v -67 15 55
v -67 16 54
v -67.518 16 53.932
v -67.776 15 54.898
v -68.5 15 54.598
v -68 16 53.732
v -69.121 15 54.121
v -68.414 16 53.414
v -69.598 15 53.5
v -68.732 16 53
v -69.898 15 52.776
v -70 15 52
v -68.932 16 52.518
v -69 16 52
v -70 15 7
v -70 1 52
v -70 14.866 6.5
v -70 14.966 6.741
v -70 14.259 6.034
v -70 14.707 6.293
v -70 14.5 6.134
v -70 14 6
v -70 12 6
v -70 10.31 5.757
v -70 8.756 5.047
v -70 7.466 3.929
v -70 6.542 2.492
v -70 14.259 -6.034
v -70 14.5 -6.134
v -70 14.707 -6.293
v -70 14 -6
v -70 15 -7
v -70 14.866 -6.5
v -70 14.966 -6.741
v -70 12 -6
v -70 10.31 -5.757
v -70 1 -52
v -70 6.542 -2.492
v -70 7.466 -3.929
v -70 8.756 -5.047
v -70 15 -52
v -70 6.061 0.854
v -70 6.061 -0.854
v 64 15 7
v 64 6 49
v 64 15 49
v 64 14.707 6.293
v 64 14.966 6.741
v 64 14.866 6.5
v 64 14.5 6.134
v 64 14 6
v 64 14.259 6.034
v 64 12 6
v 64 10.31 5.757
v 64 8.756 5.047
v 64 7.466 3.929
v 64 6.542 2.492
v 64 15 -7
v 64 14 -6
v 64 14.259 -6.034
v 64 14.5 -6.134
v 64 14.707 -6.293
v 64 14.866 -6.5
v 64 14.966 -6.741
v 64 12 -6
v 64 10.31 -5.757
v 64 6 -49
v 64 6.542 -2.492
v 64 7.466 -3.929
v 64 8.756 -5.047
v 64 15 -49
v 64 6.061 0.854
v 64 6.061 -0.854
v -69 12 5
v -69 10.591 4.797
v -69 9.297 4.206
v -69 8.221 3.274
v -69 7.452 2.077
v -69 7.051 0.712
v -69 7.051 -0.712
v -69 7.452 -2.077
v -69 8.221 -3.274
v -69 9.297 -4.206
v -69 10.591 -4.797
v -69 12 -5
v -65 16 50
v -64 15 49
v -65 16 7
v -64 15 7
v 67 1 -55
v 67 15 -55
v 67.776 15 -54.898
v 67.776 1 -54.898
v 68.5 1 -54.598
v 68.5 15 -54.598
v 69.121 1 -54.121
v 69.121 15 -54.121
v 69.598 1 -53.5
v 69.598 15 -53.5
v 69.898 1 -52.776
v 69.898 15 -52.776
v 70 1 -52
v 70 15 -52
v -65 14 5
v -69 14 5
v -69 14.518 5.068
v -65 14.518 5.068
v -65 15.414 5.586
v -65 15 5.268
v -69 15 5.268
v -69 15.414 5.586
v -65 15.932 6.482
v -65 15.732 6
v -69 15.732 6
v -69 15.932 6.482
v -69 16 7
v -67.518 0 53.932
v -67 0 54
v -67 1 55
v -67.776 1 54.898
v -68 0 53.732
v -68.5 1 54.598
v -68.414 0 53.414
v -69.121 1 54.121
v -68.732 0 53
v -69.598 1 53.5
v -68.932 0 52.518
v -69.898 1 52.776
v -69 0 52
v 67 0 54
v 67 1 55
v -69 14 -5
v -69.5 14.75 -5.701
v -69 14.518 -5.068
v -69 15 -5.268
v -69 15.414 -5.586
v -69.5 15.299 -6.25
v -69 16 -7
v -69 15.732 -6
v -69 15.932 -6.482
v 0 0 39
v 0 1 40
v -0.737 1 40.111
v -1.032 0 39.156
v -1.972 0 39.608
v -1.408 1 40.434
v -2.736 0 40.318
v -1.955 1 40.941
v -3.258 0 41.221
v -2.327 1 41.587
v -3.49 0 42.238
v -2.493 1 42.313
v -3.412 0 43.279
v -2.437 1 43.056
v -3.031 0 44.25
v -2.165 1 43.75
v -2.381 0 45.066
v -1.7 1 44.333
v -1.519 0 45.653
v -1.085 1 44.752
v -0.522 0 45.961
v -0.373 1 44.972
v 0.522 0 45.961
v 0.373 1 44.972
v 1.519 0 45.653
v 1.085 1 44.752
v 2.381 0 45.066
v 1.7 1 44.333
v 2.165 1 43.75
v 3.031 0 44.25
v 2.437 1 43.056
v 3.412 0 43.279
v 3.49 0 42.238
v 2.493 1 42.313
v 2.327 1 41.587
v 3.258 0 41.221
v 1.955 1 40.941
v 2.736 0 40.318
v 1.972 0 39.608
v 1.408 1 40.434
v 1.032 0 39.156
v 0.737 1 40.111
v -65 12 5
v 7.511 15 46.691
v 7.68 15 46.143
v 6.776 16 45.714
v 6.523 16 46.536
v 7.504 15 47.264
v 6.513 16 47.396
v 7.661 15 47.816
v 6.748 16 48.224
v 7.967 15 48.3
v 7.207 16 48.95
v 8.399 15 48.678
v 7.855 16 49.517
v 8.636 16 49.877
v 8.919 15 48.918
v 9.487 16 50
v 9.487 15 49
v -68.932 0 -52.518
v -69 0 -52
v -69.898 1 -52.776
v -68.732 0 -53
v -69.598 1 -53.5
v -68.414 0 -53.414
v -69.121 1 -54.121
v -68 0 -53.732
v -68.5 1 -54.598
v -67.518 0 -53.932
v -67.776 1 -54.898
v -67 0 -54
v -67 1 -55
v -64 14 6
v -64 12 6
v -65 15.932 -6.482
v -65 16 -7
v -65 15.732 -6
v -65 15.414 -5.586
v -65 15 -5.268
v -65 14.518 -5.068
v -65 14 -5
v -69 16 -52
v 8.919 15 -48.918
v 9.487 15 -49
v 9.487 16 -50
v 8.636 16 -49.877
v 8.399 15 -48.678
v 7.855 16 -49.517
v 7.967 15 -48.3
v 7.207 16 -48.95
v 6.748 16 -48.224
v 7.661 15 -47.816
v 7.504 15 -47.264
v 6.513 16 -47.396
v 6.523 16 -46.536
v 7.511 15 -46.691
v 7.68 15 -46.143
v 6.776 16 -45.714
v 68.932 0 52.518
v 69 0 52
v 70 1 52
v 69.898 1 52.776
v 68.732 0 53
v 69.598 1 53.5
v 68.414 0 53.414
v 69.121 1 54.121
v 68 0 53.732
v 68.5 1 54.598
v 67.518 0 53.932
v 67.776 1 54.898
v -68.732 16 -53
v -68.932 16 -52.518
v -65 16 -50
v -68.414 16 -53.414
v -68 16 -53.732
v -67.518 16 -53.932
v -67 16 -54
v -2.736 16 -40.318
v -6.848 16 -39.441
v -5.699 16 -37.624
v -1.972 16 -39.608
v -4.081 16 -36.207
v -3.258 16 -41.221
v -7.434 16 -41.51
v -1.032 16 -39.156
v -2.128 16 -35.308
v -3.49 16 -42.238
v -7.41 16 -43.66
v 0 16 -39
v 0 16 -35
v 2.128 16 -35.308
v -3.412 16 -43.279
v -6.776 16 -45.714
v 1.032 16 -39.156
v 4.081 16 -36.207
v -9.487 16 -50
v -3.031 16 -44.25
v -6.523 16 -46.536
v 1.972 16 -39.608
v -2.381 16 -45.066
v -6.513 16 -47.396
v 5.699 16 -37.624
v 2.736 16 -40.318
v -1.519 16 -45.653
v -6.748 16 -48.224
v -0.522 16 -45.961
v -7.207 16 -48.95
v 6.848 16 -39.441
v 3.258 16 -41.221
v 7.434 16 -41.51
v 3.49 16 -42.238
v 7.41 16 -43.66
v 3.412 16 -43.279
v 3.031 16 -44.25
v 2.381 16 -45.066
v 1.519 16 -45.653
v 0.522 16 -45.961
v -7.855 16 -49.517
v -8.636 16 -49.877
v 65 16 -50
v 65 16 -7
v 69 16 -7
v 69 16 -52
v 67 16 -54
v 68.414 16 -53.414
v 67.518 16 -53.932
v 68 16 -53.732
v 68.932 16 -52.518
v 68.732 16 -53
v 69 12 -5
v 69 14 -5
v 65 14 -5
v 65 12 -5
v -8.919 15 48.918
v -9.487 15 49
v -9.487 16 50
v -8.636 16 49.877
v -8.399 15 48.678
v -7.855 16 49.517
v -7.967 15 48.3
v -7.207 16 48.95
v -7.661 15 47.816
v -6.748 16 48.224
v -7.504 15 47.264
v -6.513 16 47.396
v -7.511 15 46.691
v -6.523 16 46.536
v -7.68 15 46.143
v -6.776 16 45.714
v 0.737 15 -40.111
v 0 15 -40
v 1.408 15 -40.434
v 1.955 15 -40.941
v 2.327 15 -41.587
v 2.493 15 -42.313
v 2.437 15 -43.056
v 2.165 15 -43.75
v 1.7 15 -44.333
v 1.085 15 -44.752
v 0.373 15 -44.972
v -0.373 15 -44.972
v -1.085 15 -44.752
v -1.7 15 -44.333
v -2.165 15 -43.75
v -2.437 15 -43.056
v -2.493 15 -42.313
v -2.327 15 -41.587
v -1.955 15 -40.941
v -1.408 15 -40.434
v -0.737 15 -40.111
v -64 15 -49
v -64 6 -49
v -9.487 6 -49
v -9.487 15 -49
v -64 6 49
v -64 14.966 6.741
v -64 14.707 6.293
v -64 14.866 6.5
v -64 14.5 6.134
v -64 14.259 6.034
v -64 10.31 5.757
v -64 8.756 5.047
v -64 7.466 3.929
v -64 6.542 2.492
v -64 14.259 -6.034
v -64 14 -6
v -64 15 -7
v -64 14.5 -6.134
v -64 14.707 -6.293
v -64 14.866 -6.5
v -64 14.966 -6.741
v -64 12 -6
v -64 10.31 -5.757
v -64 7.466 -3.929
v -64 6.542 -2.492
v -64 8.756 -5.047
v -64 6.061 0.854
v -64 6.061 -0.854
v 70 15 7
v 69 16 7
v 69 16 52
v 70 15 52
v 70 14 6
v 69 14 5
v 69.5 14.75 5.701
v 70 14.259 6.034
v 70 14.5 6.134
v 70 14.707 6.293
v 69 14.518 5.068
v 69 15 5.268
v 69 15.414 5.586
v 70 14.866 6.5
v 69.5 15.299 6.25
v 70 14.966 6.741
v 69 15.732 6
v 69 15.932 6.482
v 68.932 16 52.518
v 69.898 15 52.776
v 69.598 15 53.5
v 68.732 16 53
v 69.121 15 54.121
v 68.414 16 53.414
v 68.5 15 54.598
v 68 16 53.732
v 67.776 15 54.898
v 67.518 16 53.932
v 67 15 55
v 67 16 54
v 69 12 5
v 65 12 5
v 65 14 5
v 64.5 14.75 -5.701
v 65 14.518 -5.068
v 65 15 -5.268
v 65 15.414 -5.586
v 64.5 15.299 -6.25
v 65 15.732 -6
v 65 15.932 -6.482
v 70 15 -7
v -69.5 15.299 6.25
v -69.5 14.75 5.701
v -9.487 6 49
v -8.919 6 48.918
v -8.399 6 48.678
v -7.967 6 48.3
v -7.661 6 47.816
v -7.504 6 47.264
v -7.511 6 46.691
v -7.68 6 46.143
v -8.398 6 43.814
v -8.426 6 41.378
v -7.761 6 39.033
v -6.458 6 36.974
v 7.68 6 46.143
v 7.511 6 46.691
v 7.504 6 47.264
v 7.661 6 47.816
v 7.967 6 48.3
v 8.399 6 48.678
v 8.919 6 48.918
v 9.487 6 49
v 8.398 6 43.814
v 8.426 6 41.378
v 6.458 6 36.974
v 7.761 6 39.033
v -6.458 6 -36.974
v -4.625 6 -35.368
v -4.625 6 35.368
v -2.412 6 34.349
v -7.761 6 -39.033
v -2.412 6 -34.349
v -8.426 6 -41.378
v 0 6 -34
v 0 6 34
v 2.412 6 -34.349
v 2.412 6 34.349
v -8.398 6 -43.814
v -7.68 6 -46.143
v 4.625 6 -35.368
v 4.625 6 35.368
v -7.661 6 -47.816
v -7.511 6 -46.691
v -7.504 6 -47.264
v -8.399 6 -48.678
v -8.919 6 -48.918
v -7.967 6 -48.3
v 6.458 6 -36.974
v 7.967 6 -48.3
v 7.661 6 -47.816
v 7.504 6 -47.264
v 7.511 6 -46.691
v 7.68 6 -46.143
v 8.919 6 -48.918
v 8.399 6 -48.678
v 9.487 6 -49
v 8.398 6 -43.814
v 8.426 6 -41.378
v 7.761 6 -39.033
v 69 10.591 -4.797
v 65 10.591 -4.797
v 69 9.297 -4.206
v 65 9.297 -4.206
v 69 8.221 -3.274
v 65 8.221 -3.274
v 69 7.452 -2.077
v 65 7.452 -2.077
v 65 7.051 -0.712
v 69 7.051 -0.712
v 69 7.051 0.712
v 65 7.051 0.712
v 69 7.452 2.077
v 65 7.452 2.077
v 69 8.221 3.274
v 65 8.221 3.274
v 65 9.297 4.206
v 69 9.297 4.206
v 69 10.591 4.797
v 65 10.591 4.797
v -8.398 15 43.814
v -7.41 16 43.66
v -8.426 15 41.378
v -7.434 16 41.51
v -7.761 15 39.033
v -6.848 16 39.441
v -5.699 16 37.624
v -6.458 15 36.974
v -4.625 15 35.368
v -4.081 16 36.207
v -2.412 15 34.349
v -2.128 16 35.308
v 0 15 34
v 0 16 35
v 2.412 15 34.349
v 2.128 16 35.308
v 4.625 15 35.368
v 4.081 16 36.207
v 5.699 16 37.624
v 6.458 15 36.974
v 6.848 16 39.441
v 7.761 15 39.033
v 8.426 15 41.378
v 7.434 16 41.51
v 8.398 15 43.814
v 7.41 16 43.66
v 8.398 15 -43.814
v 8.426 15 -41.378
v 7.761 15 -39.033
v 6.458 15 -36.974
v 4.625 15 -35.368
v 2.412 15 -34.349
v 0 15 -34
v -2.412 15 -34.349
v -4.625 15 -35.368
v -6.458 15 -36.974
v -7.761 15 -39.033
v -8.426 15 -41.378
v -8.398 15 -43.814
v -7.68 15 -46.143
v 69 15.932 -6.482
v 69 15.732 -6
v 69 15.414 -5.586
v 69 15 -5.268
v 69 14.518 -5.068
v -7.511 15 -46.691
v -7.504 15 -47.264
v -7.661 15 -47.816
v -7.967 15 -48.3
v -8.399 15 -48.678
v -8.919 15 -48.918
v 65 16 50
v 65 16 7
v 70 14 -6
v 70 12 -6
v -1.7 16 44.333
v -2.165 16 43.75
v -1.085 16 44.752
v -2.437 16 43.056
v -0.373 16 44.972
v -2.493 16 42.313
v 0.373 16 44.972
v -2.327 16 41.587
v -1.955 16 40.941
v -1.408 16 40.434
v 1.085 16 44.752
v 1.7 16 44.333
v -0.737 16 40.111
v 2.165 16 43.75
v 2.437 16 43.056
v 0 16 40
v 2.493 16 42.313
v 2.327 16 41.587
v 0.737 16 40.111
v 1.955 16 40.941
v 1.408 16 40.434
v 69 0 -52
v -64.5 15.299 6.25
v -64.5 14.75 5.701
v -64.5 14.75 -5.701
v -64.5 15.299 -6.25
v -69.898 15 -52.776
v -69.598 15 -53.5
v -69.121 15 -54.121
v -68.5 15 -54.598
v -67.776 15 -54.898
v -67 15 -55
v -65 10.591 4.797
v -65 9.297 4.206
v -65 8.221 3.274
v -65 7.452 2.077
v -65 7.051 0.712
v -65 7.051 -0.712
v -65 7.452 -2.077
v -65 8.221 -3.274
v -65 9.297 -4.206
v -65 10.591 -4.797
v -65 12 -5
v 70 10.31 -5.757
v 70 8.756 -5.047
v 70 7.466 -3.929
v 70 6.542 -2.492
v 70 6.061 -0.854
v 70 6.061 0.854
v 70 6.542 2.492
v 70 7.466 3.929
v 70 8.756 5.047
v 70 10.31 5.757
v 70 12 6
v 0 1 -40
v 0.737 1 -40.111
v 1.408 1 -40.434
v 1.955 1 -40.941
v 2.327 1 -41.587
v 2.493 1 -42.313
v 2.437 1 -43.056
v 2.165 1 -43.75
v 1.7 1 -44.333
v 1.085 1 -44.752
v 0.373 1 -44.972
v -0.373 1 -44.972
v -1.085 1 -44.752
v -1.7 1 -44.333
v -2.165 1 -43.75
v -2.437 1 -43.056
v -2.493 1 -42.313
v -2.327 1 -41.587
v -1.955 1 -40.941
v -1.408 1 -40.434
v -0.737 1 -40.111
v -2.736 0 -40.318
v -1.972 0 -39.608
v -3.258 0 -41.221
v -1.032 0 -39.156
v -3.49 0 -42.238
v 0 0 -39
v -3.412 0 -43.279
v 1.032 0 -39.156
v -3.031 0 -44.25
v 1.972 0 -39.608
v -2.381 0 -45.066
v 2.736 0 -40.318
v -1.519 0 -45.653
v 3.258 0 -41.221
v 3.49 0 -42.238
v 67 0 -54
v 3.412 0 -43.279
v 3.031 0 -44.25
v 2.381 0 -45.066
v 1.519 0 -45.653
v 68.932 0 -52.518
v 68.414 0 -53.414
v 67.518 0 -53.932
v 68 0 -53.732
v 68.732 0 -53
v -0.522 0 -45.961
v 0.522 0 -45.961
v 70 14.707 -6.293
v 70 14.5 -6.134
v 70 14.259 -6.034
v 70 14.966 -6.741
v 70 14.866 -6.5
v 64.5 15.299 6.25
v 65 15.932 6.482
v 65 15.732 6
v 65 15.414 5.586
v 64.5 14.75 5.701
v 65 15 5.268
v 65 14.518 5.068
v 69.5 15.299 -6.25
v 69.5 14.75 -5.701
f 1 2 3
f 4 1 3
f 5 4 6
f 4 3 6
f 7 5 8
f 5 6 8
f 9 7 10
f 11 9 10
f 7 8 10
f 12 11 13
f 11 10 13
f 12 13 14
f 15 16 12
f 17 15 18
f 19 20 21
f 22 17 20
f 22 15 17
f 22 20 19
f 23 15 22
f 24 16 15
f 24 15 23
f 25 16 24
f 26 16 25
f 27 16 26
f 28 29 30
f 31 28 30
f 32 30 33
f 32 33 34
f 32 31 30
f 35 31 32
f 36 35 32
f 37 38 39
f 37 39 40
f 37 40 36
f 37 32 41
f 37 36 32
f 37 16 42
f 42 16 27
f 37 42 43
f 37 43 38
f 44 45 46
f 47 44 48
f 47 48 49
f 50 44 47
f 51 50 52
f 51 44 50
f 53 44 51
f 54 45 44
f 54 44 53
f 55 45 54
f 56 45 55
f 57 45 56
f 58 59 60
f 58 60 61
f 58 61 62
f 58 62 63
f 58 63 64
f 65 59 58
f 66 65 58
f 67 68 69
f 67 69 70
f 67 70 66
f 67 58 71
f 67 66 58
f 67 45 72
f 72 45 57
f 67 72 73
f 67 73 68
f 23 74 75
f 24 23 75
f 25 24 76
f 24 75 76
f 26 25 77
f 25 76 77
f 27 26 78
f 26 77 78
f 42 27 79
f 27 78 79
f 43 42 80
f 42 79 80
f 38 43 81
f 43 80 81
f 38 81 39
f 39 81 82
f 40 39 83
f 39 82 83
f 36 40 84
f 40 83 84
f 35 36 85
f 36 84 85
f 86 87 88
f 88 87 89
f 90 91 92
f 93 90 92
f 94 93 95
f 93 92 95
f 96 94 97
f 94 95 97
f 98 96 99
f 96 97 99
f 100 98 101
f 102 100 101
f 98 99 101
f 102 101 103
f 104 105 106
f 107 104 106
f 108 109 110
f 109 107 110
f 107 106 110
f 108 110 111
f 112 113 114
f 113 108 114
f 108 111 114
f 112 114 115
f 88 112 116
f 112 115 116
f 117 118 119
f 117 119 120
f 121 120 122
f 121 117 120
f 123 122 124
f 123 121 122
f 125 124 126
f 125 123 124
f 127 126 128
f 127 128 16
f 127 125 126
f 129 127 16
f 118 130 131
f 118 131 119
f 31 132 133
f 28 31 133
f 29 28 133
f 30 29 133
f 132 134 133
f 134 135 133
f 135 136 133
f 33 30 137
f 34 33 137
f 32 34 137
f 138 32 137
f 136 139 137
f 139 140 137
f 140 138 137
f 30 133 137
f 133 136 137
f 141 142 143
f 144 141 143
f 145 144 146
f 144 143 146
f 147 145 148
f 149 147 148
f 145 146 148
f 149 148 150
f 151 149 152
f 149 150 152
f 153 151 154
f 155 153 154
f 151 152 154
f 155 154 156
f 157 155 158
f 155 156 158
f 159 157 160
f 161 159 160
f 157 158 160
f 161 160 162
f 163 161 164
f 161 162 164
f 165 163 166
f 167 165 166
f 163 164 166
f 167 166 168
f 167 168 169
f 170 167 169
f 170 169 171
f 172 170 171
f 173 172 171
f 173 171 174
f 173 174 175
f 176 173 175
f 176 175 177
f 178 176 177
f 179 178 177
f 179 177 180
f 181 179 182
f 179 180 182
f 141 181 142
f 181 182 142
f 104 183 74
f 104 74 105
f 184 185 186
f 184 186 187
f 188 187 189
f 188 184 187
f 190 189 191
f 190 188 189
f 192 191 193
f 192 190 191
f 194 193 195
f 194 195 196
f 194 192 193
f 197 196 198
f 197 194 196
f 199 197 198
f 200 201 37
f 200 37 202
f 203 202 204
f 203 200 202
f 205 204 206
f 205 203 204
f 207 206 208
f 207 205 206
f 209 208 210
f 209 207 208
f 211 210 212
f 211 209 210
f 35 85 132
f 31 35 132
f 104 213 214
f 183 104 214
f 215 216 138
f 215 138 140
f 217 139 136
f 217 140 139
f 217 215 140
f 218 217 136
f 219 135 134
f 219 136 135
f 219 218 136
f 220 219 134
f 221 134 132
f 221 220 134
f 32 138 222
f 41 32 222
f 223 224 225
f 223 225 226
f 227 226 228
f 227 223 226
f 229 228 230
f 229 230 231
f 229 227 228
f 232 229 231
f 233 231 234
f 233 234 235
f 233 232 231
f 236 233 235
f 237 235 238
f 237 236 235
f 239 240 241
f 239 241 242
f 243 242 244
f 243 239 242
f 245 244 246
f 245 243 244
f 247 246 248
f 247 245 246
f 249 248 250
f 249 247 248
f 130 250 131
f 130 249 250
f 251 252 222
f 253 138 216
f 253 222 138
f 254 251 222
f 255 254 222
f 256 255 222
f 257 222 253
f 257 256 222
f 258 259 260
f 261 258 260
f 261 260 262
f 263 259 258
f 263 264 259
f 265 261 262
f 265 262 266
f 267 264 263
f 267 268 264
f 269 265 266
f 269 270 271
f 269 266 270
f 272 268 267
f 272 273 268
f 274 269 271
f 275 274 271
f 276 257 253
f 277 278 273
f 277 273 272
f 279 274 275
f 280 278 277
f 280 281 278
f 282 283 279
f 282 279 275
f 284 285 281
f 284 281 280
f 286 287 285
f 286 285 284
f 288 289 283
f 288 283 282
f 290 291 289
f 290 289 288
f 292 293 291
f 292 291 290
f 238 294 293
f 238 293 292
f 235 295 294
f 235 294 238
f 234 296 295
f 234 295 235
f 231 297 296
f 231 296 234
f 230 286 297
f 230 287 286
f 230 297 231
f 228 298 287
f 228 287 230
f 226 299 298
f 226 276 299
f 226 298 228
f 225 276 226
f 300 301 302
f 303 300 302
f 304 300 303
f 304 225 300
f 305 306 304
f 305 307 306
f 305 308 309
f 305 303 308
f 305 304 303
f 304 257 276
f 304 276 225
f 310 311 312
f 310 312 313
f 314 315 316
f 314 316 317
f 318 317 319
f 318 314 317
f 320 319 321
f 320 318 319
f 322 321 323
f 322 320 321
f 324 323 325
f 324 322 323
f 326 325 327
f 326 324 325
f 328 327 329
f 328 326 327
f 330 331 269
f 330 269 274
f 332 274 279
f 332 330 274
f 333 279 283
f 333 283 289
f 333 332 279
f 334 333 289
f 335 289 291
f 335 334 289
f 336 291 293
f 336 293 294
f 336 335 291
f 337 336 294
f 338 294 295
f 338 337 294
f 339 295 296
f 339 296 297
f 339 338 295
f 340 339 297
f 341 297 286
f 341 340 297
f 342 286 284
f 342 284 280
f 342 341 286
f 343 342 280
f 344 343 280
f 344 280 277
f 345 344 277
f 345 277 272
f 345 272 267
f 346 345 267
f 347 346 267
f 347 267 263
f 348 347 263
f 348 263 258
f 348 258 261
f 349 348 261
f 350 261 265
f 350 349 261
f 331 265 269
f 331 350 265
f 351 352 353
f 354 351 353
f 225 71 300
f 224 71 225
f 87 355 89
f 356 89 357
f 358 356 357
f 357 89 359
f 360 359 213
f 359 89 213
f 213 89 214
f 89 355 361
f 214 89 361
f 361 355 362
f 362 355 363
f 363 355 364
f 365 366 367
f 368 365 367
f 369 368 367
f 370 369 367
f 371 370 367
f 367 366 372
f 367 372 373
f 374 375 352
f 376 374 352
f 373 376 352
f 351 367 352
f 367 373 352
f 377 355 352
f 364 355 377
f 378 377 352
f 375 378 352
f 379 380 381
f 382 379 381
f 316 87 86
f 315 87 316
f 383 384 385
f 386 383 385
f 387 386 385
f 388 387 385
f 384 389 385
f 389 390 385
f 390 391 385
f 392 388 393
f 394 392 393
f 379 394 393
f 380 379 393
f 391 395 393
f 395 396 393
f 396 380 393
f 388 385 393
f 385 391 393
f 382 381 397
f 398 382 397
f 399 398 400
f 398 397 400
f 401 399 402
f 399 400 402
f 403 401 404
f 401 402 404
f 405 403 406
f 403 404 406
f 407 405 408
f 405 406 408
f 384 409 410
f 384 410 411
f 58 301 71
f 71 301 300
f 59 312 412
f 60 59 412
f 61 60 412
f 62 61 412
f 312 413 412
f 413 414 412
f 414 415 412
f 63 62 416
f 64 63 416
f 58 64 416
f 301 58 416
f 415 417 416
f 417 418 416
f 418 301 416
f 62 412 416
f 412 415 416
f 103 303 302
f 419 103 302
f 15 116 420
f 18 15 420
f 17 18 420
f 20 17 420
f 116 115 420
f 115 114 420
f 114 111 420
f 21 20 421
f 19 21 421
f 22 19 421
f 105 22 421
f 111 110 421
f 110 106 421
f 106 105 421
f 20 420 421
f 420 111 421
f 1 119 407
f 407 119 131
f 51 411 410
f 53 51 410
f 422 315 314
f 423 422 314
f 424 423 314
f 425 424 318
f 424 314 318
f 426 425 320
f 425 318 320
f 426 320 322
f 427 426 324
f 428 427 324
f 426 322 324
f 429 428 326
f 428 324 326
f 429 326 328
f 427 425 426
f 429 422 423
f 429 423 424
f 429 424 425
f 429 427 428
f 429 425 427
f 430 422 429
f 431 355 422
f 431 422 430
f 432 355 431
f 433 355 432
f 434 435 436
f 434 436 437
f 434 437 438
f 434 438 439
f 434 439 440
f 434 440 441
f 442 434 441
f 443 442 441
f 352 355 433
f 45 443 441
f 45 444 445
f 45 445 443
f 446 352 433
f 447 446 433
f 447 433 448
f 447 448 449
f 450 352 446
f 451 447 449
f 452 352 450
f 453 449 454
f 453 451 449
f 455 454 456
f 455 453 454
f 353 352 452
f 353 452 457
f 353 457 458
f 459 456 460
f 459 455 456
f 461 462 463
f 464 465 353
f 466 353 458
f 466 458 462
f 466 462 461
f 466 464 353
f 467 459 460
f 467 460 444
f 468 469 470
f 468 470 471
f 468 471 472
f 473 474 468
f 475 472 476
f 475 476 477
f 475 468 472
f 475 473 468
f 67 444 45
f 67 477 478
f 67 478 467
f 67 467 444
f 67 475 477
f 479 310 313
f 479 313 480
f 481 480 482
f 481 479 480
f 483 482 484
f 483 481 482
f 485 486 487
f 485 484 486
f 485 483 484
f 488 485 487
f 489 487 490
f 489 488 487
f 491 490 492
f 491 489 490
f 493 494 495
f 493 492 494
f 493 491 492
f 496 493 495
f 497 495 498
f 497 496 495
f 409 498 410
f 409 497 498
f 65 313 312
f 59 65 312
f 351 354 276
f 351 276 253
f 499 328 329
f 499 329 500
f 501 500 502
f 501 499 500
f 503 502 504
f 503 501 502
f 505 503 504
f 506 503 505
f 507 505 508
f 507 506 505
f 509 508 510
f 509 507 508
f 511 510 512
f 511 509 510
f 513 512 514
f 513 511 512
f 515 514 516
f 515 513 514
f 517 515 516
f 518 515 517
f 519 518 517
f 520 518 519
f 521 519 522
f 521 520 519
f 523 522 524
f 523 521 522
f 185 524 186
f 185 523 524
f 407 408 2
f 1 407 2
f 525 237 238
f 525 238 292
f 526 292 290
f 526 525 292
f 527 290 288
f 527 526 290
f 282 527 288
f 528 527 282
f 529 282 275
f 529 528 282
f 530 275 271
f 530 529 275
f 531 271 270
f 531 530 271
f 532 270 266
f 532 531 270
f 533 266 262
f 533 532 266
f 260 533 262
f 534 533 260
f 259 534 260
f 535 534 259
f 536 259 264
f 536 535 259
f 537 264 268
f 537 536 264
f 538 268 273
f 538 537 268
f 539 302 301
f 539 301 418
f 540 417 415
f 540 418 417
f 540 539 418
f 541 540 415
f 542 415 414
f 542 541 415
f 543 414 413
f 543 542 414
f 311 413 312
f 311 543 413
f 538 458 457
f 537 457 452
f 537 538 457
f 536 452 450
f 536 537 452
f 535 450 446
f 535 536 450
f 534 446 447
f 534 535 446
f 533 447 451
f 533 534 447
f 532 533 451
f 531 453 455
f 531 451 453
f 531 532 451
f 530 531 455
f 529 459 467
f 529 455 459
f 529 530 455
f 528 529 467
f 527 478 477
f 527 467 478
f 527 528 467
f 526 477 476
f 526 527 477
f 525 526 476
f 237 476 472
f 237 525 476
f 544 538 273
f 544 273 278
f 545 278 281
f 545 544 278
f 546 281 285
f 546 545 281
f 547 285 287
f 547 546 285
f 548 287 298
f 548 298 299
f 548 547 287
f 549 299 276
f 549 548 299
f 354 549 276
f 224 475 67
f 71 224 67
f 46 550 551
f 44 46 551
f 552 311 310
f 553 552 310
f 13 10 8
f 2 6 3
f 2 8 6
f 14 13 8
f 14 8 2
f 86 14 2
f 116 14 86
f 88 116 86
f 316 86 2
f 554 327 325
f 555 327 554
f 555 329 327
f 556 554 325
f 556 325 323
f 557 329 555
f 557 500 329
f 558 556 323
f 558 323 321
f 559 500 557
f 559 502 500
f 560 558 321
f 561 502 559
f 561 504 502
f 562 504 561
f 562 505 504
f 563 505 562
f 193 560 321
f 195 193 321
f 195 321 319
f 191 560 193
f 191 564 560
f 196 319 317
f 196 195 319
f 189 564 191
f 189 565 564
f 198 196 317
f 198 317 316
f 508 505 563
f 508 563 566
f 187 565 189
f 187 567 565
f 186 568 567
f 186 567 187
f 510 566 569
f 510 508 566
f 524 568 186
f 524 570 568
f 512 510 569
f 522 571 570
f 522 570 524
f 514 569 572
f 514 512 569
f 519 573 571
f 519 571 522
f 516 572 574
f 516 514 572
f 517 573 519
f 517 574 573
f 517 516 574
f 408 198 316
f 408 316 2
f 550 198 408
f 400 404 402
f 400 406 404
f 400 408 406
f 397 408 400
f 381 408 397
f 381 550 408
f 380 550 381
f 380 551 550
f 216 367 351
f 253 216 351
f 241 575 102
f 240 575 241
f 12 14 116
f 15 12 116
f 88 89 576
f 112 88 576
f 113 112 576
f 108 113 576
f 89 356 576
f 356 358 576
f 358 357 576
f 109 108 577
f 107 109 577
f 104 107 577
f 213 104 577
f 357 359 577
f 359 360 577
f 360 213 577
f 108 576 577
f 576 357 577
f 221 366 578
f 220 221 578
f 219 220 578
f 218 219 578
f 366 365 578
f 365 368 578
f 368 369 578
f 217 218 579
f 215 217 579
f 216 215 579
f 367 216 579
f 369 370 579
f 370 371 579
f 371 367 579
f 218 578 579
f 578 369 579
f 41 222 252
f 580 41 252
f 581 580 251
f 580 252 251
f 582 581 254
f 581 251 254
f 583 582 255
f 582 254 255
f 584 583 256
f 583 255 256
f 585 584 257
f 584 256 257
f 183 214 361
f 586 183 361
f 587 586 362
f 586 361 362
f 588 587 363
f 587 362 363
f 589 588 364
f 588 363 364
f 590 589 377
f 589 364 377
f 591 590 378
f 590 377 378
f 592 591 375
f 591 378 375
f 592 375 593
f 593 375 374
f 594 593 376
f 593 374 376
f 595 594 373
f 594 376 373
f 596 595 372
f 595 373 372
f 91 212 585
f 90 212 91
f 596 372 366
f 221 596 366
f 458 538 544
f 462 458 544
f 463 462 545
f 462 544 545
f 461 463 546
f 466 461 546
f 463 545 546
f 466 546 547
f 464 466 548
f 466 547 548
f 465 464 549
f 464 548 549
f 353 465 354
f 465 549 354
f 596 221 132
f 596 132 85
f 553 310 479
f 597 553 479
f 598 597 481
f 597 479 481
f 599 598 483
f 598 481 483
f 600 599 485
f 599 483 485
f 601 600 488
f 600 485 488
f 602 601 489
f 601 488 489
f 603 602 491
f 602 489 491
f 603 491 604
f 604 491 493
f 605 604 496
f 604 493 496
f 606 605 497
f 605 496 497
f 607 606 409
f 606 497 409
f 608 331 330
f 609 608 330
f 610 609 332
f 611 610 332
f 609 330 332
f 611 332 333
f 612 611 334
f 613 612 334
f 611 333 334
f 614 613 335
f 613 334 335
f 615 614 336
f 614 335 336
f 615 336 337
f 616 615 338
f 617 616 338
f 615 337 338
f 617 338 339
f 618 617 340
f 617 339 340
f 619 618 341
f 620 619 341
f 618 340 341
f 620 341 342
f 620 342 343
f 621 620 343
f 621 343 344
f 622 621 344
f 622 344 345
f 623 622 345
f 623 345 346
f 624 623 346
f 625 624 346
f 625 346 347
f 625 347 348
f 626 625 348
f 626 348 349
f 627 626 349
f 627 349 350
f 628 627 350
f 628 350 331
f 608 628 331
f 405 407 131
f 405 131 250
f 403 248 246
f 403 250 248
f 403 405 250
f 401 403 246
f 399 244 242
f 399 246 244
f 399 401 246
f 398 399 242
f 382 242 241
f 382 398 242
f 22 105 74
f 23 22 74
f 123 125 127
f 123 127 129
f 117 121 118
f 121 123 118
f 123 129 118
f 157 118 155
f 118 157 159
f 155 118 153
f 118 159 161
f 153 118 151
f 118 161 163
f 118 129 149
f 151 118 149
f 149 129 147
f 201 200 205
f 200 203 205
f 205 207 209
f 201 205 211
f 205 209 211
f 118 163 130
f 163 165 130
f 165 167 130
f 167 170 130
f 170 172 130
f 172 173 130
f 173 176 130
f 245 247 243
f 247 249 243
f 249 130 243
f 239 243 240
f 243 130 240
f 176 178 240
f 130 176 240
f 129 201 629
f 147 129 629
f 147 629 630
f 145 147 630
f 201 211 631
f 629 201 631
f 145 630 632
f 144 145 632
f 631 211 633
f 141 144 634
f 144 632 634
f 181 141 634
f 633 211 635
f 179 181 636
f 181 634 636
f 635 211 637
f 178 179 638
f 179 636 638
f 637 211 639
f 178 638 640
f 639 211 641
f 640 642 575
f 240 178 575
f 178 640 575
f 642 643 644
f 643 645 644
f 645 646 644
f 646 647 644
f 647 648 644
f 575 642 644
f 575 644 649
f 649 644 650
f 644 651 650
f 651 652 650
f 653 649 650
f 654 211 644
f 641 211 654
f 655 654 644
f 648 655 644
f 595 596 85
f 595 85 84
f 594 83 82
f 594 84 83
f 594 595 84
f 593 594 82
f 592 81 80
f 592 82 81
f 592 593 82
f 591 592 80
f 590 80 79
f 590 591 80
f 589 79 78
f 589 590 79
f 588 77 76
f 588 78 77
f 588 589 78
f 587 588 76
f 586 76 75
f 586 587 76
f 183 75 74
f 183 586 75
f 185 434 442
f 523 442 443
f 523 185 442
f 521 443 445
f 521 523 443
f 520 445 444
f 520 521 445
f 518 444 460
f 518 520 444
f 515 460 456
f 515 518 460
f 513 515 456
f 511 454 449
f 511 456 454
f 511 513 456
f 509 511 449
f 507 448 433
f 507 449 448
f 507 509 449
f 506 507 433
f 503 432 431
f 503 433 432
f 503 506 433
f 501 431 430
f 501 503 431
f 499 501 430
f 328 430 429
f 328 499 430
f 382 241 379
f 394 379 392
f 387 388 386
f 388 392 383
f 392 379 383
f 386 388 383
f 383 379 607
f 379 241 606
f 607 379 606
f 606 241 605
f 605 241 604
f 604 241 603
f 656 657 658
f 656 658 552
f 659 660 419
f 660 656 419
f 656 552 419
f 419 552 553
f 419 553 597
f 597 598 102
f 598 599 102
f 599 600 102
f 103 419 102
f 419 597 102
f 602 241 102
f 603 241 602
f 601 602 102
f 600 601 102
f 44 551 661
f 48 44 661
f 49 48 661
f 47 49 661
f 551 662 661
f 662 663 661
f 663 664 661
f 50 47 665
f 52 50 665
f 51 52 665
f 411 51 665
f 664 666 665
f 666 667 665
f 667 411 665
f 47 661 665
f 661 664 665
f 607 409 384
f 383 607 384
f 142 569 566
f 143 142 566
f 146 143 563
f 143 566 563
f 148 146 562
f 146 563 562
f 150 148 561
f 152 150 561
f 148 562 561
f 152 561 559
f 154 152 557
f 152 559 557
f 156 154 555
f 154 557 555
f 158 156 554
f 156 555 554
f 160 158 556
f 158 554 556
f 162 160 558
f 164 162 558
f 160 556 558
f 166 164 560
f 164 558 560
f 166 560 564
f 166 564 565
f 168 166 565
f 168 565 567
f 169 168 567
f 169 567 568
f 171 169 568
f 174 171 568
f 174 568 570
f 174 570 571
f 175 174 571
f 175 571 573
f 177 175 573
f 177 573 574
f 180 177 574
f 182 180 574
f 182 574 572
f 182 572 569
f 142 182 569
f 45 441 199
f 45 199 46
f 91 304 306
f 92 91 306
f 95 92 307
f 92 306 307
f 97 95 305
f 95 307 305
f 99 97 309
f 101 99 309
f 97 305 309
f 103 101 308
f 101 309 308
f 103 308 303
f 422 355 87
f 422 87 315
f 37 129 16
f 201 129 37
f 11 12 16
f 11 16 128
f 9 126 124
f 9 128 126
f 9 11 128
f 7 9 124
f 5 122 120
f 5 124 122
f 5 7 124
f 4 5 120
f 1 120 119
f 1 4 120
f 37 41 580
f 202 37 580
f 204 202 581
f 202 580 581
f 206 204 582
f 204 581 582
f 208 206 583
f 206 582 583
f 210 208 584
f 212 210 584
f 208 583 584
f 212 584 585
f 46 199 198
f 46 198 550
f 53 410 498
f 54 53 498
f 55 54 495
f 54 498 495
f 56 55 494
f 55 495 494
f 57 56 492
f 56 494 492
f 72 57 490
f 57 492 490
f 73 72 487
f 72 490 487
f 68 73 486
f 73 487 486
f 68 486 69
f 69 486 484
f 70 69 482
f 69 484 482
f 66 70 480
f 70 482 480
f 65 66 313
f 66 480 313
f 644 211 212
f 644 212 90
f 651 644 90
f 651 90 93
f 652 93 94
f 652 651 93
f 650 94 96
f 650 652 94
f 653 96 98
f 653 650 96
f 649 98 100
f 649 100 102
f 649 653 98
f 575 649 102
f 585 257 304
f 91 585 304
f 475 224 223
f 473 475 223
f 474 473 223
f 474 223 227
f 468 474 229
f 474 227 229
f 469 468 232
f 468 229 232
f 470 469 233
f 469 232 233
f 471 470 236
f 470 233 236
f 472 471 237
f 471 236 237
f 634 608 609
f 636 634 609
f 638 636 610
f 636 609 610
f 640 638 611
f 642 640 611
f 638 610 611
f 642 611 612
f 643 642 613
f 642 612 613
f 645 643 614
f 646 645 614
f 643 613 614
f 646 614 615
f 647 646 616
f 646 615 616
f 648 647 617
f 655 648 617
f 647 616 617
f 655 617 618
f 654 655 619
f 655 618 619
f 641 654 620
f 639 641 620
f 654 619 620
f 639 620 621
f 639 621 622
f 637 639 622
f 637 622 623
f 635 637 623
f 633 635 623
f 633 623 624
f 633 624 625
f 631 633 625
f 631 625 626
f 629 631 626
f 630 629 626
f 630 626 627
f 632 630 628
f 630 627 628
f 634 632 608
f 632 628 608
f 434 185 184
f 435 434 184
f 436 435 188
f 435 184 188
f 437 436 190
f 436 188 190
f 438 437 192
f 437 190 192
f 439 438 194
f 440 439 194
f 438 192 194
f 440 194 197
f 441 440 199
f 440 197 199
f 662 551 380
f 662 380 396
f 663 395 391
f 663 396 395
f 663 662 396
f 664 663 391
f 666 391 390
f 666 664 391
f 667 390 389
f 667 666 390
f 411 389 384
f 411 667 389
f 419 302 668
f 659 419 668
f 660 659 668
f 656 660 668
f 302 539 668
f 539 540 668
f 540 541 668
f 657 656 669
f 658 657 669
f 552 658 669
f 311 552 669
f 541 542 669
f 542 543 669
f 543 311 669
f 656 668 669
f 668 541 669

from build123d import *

# Parameters (mm, degrees)
SKETCH1_W           = 140
SKETCH1_H           = 110
BOSS_EXTRUDE1_DEPTH = 16
SKETCH2_R           = 2.5
CUT_EXTRUDE1_DEPTH  = 91.44888059
FILLET1_R           = 3
SHELL1_T            = -6
CUT_EXTRUDE2_DEPTH  = 152.26466871
FILLET2_R           = 2
CHAMFER2_SIZE       = 1


with BuildPart() as part:
    # Sketch1 → Boss-Extrude1 (new body)
    with BuildSketch(Plane(origin=(0, 0, 0), x_dir=(1, 0, 0), z_dir=(0, 1, 0))):
        Rectangle(SKETCH1_W, SKETCH1_H)
    extrude(amount=BOSS_EXTRUDE1_DEPTH)

    # Sketch2 → Cut-Extrude1 (cut, through all)
    with BuildSketch(Plane(origin=(0, 16, 0), x_dir=(1, 0, 0), z_dir=(0, 1, 0))):
        with Locations(Location((0, 42.5, 0), (0, 0, 270))):
            Circle(SKETCH2_R)
        with Locations(Location((0, -42.5, 0), (0, 0, 90))):
            Circle(SKETCH2_R)
    extrude(amount=-CUT_EXTRUDE1_DEPTH, mode=Mode.SUBTRACT)

    # Fillet1
    fillet1_edges = [part.edges().sort_by_distance(p)[0] for p in [
        (70, 8, 55),
        (-70, 8, 55),
        (-70, 8, -55),
        (70, 8, -55),
    ]]
    fillet(fillet1_edges, radius=FILLET1_R)

    # Shell1
    shell1_openings = [part.faces().sort_by_distance(p)[0] for p in [
        (0, 16, 0),
    ]]
    offset(amount=SHELL1_T, openings=shell1_openings, kind=Kind.INTERSECTION)

    # Sketch3 → Cut-Extrude2 (cut, through all)
    with BuildSketch(Plane(origin=(70, 0, 0), x_dir=(0, 0, -1), z_dir=(1, 0, 0))):
        with BuildLine():
            Line((5, 20), (5, 12))
            ThreePointArc((5, 12), (0, 7), (-5, 12))
            Line((-5, 12), (-5, 20))
            ThreePointArc((-5, 20), (0, 25), (5, 20))
        make_face()
    extrude(amount=-CUT_EXTRUDE2_DEPTH, mode=Mode.SUBTRACT)

    # Fillet2
    fillet2_edges = [part.edges().sort_by_distance(p)[0] for p in [
        (-5.477225575, 11, -49),
        (5.477225575, 11, 49),
        (-5.477225575, 11, 49),
        (5.477225575, 11, -49),
        (67, 16, -5),
        (-67, 16, -5),
        (67, 16, 5),
        (-67, 16, 5),
    ]]
    fillet(fillet2_edges, radius=FILLET2_R)

    # Chamfer2
    chamfer2_edges = [part.edges().sort_by_distance(p)[0] for p in [
        (64, 13, -5),
        (64, 16, -28),
        (64, 15.414213562, -5.585786438),
        (64, 15.414213562, 5.585786438),
        (70, 13, 5),
        (70, 16, -29.5),
        (70, 15.414213562, -5.585786438),
        (70, 15.414213562, 5.585786438),
        (-36.74341649, 16, -49),
        (0, 16, -34),
        (-64, 13, 5),
        (-64, 15.414213562, 5.585786438),
        (-64, 15.414213562, -5.585786438),
        (-70, 13, 5),
        (-70, 15.414213562, 5.585786438),
        (-70, 15.414213562, -5.585786438),
        (-7.796524471, 16, 48.069044968),
        (7.796524471, 16, 48.069044968),
        (7.796524471, 16, -48.069044968),
        (-7.796524471, 16, -48.069044968),
        (0, 0, -45),
        (0, 16, -45),
        (0, 0, 45),
        (-70, 0, 0),
        (-70, 16, -29.5),
        (70, 0, 0),
        (0, 0, 55),
        (0, 0, -55),
        (69.121320344, 0, 54.121320344),
        (-69.121320344, 0, 54.121320344),
        (69.121320344, 0, -54.121320344),
        (-69.121320344, 0, -54.121320344),
        (0, 16, -55),
        (70, 16, 29.5),
        (0, 16, 55),
        (69.121320344, 16, 54.121320344),
        (-69.121320344, 16, 54.121320344),
        (69.121320344, 16, -54.121320344),
        (-69.121320344, 16, -54.121320344),
        (36.74341649, 16, -49),
        (-64, 16, -28),
        (-36.74341649, 16, 49),
        (64, 16, 28),
        (-64, 7, 0),
        (-64, 13, -5),
        (70, 13, -5),
        (70, 7, 0),
        (-70, 13, -5),
        (64, 7, 0),
        (-70, 7, 0),
        (64, 13, 5),
        (36.74341649, 16, 49),
        (0, 16, 34),
        (-64, 16, 28),
        (-70, 16, 29.5),
    ]]
    chamfer(chamfer2_edges, length=CHAMFER2_SIZE - 0.0001)  # a hair under: the kernel refuses the full size


solid = part.part
